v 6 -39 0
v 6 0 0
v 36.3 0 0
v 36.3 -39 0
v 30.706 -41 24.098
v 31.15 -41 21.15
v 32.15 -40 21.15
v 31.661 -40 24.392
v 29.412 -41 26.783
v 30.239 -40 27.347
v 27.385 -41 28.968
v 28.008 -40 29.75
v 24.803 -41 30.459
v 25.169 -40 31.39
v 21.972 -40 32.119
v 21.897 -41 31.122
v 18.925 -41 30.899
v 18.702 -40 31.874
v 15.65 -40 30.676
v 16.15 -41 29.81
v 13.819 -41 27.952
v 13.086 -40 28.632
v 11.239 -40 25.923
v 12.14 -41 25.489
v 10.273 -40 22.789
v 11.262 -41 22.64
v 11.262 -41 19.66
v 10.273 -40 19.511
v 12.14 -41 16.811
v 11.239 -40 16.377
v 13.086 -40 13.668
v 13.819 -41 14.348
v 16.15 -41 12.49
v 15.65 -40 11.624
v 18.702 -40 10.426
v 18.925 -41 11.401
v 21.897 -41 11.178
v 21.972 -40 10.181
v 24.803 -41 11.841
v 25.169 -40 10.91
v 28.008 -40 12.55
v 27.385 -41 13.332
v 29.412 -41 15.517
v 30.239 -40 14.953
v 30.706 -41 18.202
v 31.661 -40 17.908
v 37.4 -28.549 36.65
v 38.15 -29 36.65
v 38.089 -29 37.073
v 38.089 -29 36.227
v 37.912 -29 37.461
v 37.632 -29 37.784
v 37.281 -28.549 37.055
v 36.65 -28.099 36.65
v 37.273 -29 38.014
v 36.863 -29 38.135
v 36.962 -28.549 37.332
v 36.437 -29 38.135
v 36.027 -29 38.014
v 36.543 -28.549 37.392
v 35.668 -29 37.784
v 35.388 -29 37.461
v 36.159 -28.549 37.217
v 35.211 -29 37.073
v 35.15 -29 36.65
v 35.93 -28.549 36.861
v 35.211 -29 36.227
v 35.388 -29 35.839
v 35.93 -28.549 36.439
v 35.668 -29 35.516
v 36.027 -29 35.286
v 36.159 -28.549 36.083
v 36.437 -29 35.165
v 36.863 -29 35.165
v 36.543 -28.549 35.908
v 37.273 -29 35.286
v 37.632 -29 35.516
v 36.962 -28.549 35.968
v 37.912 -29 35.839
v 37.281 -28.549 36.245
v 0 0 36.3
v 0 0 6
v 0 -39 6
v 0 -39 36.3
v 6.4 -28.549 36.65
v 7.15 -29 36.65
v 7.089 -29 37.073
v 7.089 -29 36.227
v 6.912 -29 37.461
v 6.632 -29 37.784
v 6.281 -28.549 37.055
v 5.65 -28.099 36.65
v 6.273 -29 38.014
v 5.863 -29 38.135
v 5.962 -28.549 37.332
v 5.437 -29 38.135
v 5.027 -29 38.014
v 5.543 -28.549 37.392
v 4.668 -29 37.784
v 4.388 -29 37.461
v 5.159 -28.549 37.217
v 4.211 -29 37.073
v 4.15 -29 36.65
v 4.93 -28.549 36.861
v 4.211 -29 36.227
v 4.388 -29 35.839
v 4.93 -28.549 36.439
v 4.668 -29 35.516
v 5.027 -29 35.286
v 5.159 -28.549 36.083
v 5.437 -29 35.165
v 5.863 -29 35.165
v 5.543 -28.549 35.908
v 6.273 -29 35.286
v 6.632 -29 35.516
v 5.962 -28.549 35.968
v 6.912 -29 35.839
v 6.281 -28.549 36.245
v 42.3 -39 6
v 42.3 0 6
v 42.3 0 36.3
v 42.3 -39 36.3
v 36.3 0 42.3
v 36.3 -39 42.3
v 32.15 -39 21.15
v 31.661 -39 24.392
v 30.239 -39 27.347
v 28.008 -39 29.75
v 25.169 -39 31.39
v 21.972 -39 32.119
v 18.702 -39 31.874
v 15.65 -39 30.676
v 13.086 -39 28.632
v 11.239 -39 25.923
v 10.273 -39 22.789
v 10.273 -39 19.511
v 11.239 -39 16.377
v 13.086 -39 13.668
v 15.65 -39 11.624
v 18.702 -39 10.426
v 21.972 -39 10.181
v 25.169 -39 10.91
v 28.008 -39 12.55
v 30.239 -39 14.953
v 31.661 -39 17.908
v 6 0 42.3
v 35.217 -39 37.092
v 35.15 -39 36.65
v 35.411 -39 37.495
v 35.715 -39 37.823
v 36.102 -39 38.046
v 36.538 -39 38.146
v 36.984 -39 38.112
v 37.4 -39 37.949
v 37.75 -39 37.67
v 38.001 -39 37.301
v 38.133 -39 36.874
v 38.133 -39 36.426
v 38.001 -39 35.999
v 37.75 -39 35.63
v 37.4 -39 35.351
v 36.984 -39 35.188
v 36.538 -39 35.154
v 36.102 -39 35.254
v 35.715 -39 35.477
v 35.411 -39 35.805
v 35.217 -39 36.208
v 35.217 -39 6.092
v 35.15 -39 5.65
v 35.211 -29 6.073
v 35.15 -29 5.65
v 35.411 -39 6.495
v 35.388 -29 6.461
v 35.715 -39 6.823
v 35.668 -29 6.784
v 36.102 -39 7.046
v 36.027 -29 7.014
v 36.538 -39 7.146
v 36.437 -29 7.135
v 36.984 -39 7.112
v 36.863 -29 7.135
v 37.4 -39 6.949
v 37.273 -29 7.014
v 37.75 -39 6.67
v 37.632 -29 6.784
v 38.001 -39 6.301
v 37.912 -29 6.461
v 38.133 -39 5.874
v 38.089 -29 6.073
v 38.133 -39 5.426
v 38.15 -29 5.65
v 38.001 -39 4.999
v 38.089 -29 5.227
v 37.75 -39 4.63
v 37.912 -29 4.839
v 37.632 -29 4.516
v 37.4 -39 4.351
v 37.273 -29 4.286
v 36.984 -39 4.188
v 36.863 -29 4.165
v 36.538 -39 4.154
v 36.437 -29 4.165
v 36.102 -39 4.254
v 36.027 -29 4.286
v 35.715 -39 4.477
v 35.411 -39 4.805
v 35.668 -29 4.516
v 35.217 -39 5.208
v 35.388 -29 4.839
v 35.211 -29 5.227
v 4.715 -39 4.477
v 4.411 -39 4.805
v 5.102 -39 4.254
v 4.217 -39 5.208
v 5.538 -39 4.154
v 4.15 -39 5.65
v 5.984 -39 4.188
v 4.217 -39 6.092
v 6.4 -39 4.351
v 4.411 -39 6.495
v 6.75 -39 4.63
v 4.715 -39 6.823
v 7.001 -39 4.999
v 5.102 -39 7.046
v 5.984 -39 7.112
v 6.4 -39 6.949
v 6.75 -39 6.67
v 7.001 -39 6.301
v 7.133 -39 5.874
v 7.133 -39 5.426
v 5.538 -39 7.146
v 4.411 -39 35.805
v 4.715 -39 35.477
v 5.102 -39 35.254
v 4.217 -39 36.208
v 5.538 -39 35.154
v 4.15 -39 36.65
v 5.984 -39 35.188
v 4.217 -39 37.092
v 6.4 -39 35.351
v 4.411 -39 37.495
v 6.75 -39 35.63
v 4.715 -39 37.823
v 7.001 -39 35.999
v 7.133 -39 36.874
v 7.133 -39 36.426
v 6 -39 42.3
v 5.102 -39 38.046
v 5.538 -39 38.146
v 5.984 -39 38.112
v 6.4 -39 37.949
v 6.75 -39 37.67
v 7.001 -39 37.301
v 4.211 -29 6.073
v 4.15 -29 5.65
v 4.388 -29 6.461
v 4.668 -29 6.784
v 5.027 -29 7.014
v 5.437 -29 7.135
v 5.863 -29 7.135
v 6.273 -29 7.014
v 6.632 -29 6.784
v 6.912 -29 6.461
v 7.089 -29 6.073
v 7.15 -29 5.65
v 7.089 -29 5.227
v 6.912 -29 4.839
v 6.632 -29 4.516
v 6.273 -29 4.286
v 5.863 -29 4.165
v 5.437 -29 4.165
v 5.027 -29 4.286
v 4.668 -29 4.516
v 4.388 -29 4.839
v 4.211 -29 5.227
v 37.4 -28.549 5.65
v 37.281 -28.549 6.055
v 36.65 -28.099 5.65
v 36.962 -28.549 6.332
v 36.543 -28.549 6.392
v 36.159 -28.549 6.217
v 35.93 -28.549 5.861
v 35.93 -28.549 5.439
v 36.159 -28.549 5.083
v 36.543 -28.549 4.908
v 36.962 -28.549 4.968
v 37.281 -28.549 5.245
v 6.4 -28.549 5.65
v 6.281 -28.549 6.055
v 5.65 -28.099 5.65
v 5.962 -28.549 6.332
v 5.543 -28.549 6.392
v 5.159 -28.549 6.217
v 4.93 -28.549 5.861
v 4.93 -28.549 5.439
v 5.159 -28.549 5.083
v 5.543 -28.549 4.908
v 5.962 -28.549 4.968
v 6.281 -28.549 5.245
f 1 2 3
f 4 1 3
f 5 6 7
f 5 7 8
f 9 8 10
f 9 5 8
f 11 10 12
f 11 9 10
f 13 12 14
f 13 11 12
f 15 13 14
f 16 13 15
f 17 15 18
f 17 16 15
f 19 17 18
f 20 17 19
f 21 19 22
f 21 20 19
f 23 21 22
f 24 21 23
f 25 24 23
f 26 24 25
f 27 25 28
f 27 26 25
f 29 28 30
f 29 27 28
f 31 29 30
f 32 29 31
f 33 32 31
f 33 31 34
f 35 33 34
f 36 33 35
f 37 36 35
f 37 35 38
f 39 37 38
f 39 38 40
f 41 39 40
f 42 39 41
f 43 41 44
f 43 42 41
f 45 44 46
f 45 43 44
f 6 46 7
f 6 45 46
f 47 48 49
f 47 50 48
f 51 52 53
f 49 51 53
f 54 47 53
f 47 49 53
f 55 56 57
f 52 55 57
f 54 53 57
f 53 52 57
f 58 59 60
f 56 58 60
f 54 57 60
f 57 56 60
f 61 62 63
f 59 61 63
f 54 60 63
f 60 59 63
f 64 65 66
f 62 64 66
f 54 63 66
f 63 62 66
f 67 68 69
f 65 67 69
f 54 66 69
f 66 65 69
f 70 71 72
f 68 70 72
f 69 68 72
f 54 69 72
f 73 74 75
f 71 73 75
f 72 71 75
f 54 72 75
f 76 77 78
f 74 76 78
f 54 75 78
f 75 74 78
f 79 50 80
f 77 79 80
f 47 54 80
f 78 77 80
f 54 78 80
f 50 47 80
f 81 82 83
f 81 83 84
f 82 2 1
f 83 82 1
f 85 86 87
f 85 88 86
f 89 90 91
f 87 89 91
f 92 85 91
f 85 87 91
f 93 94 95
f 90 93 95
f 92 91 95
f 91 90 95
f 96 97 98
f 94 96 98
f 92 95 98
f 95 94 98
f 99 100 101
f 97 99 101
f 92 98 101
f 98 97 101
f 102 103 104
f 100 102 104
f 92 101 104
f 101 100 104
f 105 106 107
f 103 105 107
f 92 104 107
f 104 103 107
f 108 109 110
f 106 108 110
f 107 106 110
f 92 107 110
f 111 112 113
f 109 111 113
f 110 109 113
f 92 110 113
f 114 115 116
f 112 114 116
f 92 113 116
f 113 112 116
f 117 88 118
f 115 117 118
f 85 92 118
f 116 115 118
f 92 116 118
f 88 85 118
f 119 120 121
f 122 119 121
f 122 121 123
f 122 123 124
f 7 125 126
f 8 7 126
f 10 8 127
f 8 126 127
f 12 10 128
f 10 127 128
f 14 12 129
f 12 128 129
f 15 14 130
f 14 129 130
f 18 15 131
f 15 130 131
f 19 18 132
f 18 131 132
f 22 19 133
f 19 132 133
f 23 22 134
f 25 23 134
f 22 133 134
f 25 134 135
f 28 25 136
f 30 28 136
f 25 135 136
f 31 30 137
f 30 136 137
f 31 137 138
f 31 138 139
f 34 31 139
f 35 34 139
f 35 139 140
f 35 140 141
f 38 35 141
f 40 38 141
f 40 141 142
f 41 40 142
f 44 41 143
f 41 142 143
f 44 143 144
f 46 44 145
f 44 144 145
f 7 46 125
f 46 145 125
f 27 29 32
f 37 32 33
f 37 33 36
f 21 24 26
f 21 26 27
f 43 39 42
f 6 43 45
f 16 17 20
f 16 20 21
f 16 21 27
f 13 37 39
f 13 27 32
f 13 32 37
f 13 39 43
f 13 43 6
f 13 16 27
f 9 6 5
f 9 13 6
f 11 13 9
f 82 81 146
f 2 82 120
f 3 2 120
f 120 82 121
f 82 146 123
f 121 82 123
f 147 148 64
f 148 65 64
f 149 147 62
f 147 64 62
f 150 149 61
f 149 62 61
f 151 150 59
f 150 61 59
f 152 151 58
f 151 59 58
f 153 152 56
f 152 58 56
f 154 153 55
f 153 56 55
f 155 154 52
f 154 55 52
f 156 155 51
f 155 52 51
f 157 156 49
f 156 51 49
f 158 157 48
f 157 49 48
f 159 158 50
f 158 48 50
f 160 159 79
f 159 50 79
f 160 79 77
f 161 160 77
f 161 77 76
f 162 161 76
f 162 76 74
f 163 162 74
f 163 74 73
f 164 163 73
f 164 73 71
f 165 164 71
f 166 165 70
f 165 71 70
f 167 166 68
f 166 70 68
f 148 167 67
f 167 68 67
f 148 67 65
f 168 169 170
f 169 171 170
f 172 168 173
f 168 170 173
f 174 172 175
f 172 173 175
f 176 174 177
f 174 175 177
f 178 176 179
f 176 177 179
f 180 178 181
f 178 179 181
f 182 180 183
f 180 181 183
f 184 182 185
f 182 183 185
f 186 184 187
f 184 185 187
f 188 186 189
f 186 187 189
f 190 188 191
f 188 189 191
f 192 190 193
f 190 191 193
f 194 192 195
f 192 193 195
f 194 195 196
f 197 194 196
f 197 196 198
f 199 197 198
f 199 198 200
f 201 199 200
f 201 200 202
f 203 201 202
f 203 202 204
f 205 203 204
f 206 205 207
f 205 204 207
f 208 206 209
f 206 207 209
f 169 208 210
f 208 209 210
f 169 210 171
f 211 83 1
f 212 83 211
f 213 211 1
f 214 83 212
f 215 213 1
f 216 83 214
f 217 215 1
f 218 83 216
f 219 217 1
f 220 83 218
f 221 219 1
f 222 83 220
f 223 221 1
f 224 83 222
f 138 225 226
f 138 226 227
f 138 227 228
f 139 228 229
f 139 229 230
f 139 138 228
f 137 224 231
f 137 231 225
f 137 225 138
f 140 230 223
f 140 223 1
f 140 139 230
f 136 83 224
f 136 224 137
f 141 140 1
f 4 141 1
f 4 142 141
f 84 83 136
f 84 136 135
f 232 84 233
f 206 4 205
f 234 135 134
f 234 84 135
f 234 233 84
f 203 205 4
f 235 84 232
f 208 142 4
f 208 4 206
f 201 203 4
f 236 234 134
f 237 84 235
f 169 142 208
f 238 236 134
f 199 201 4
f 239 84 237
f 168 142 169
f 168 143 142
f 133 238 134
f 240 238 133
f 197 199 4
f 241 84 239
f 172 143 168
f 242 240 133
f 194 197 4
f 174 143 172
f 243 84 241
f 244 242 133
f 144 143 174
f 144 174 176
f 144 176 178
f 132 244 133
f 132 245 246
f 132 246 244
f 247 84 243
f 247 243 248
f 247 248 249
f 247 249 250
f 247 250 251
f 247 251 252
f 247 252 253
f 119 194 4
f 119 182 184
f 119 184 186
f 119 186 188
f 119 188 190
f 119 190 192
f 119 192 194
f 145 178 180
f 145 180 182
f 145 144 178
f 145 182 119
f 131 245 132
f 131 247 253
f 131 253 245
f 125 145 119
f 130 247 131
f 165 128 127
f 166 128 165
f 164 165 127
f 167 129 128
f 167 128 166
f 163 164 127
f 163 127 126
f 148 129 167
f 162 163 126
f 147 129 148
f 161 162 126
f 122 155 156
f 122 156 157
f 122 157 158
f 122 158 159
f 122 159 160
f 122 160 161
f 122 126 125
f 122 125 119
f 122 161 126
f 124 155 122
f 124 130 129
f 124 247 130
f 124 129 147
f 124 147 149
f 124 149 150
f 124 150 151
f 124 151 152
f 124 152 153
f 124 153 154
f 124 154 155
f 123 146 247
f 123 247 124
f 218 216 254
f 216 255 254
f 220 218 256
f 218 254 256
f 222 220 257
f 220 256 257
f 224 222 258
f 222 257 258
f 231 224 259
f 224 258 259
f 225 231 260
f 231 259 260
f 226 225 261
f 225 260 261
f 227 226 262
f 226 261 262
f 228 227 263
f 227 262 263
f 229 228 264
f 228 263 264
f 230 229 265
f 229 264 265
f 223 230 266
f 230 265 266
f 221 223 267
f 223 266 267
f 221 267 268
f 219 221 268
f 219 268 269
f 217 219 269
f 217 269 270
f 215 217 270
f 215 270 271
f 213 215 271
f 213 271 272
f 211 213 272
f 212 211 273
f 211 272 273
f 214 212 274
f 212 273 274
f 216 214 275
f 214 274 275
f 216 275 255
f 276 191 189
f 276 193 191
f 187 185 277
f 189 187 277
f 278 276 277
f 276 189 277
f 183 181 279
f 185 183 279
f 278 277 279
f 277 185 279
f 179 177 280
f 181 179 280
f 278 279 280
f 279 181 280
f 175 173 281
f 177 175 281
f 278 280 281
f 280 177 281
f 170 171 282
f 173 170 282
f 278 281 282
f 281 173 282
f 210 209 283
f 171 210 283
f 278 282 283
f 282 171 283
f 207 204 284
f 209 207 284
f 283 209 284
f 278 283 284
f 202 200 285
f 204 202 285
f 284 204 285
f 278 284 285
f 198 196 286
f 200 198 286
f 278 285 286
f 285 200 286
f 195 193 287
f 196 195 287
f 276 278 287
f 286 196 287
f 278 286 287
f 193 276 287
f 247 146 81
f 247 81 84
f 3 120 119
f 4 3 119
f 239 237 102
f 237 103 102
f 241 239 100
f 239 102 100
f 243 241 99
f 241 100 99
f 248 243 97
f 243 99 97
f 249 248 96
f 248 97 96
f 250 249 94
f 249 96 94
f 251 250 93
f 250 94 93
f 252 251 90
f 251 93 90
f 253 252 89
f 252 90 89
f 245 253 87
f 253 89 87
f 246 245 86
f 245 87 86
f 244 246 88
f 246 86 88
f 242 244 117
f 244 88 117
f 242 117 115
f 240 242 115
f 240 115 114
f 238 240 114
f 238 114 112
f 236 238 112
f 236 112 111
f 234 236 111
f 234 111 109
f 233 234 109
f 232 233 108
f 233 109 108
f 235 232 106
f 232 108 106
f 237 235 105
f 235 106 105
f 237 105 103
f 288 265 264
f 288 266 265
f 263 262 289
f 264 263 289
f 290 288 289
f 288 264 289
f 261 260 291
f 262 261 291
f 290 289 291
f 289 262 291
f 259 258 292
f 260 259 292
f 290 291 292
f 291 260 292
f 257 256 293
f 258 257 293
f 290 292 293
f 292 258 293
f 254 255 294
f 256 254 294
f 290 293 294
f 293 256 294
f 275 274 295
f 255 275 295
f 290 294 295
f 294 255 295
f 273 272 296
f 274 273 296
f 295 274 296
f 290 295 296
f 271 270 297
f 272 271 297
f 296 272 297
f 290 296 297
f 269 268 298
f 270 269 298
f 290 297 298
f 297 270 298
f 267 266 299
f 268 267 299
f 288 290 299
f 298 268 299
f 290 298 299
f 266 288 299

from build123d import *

# Parameters (mm, degrees)
F0_W     = 42.3
F0_H     = 42.3
F1_DEPTH = 39
F2_R     = 11
F3_DEPTH = 2
F4_SIZE  = 1
F6_D     = 3
F6_DEPTH = 10
F6_TIP   = 0.9012909285
F7_SIZE  = 6


with BuildPart() as f1:
    # F0 (on Front) → F1 (new body)
    with BuildSketch(Plane.XZ):
        with Locations((21.15, 21.15)):
            Rectangle(F0_W, F0_H)
    extrude(amount=F1_DEPTH)

    # F2 (on face) → F3 (join)
    with BuildSketch(Plane.XZ.offset(39)):
        with Locations((21.15, 21.15)):
            Circle(F2_R)
    extrude(amount=F3_DEPTH)

    # F4
    f4_edges = [f1.edges().sort_by_distance(p)[0] for p in [
        (10.15, -41, 21.15),
    ]]
    chamfer(f4_edges, length=F4_SIZE)

    # F6
    with Locations(Plane.XZ.offset(39)):
        with Locations((5.65, 36.65), (36.65, 36.65), (36.65, 5.65), (5.65, 5.65)):
            Hole(F6_D / 2, depth=F6_DEPTH)
            with Locations((0, 0, -(F6_DEPTH + F6_TIP / 2))):  # 118° drill point
                Cone(0, F6_D / 2, F6_TIP, mode=Mode.SUBTRACT)

    # F7
    f7_edges = [f1.edges().sort_by_distance(p)[0] for p in [
        (0, -19.5, 42.3),
        (0, -19.5, 0),
        (42.3, -19.5, 42.3),
        (42.3, -19.5, 0),
    ]]
    chamfer(f7_edges, length=F7_SIZE)


solid = f1.part
